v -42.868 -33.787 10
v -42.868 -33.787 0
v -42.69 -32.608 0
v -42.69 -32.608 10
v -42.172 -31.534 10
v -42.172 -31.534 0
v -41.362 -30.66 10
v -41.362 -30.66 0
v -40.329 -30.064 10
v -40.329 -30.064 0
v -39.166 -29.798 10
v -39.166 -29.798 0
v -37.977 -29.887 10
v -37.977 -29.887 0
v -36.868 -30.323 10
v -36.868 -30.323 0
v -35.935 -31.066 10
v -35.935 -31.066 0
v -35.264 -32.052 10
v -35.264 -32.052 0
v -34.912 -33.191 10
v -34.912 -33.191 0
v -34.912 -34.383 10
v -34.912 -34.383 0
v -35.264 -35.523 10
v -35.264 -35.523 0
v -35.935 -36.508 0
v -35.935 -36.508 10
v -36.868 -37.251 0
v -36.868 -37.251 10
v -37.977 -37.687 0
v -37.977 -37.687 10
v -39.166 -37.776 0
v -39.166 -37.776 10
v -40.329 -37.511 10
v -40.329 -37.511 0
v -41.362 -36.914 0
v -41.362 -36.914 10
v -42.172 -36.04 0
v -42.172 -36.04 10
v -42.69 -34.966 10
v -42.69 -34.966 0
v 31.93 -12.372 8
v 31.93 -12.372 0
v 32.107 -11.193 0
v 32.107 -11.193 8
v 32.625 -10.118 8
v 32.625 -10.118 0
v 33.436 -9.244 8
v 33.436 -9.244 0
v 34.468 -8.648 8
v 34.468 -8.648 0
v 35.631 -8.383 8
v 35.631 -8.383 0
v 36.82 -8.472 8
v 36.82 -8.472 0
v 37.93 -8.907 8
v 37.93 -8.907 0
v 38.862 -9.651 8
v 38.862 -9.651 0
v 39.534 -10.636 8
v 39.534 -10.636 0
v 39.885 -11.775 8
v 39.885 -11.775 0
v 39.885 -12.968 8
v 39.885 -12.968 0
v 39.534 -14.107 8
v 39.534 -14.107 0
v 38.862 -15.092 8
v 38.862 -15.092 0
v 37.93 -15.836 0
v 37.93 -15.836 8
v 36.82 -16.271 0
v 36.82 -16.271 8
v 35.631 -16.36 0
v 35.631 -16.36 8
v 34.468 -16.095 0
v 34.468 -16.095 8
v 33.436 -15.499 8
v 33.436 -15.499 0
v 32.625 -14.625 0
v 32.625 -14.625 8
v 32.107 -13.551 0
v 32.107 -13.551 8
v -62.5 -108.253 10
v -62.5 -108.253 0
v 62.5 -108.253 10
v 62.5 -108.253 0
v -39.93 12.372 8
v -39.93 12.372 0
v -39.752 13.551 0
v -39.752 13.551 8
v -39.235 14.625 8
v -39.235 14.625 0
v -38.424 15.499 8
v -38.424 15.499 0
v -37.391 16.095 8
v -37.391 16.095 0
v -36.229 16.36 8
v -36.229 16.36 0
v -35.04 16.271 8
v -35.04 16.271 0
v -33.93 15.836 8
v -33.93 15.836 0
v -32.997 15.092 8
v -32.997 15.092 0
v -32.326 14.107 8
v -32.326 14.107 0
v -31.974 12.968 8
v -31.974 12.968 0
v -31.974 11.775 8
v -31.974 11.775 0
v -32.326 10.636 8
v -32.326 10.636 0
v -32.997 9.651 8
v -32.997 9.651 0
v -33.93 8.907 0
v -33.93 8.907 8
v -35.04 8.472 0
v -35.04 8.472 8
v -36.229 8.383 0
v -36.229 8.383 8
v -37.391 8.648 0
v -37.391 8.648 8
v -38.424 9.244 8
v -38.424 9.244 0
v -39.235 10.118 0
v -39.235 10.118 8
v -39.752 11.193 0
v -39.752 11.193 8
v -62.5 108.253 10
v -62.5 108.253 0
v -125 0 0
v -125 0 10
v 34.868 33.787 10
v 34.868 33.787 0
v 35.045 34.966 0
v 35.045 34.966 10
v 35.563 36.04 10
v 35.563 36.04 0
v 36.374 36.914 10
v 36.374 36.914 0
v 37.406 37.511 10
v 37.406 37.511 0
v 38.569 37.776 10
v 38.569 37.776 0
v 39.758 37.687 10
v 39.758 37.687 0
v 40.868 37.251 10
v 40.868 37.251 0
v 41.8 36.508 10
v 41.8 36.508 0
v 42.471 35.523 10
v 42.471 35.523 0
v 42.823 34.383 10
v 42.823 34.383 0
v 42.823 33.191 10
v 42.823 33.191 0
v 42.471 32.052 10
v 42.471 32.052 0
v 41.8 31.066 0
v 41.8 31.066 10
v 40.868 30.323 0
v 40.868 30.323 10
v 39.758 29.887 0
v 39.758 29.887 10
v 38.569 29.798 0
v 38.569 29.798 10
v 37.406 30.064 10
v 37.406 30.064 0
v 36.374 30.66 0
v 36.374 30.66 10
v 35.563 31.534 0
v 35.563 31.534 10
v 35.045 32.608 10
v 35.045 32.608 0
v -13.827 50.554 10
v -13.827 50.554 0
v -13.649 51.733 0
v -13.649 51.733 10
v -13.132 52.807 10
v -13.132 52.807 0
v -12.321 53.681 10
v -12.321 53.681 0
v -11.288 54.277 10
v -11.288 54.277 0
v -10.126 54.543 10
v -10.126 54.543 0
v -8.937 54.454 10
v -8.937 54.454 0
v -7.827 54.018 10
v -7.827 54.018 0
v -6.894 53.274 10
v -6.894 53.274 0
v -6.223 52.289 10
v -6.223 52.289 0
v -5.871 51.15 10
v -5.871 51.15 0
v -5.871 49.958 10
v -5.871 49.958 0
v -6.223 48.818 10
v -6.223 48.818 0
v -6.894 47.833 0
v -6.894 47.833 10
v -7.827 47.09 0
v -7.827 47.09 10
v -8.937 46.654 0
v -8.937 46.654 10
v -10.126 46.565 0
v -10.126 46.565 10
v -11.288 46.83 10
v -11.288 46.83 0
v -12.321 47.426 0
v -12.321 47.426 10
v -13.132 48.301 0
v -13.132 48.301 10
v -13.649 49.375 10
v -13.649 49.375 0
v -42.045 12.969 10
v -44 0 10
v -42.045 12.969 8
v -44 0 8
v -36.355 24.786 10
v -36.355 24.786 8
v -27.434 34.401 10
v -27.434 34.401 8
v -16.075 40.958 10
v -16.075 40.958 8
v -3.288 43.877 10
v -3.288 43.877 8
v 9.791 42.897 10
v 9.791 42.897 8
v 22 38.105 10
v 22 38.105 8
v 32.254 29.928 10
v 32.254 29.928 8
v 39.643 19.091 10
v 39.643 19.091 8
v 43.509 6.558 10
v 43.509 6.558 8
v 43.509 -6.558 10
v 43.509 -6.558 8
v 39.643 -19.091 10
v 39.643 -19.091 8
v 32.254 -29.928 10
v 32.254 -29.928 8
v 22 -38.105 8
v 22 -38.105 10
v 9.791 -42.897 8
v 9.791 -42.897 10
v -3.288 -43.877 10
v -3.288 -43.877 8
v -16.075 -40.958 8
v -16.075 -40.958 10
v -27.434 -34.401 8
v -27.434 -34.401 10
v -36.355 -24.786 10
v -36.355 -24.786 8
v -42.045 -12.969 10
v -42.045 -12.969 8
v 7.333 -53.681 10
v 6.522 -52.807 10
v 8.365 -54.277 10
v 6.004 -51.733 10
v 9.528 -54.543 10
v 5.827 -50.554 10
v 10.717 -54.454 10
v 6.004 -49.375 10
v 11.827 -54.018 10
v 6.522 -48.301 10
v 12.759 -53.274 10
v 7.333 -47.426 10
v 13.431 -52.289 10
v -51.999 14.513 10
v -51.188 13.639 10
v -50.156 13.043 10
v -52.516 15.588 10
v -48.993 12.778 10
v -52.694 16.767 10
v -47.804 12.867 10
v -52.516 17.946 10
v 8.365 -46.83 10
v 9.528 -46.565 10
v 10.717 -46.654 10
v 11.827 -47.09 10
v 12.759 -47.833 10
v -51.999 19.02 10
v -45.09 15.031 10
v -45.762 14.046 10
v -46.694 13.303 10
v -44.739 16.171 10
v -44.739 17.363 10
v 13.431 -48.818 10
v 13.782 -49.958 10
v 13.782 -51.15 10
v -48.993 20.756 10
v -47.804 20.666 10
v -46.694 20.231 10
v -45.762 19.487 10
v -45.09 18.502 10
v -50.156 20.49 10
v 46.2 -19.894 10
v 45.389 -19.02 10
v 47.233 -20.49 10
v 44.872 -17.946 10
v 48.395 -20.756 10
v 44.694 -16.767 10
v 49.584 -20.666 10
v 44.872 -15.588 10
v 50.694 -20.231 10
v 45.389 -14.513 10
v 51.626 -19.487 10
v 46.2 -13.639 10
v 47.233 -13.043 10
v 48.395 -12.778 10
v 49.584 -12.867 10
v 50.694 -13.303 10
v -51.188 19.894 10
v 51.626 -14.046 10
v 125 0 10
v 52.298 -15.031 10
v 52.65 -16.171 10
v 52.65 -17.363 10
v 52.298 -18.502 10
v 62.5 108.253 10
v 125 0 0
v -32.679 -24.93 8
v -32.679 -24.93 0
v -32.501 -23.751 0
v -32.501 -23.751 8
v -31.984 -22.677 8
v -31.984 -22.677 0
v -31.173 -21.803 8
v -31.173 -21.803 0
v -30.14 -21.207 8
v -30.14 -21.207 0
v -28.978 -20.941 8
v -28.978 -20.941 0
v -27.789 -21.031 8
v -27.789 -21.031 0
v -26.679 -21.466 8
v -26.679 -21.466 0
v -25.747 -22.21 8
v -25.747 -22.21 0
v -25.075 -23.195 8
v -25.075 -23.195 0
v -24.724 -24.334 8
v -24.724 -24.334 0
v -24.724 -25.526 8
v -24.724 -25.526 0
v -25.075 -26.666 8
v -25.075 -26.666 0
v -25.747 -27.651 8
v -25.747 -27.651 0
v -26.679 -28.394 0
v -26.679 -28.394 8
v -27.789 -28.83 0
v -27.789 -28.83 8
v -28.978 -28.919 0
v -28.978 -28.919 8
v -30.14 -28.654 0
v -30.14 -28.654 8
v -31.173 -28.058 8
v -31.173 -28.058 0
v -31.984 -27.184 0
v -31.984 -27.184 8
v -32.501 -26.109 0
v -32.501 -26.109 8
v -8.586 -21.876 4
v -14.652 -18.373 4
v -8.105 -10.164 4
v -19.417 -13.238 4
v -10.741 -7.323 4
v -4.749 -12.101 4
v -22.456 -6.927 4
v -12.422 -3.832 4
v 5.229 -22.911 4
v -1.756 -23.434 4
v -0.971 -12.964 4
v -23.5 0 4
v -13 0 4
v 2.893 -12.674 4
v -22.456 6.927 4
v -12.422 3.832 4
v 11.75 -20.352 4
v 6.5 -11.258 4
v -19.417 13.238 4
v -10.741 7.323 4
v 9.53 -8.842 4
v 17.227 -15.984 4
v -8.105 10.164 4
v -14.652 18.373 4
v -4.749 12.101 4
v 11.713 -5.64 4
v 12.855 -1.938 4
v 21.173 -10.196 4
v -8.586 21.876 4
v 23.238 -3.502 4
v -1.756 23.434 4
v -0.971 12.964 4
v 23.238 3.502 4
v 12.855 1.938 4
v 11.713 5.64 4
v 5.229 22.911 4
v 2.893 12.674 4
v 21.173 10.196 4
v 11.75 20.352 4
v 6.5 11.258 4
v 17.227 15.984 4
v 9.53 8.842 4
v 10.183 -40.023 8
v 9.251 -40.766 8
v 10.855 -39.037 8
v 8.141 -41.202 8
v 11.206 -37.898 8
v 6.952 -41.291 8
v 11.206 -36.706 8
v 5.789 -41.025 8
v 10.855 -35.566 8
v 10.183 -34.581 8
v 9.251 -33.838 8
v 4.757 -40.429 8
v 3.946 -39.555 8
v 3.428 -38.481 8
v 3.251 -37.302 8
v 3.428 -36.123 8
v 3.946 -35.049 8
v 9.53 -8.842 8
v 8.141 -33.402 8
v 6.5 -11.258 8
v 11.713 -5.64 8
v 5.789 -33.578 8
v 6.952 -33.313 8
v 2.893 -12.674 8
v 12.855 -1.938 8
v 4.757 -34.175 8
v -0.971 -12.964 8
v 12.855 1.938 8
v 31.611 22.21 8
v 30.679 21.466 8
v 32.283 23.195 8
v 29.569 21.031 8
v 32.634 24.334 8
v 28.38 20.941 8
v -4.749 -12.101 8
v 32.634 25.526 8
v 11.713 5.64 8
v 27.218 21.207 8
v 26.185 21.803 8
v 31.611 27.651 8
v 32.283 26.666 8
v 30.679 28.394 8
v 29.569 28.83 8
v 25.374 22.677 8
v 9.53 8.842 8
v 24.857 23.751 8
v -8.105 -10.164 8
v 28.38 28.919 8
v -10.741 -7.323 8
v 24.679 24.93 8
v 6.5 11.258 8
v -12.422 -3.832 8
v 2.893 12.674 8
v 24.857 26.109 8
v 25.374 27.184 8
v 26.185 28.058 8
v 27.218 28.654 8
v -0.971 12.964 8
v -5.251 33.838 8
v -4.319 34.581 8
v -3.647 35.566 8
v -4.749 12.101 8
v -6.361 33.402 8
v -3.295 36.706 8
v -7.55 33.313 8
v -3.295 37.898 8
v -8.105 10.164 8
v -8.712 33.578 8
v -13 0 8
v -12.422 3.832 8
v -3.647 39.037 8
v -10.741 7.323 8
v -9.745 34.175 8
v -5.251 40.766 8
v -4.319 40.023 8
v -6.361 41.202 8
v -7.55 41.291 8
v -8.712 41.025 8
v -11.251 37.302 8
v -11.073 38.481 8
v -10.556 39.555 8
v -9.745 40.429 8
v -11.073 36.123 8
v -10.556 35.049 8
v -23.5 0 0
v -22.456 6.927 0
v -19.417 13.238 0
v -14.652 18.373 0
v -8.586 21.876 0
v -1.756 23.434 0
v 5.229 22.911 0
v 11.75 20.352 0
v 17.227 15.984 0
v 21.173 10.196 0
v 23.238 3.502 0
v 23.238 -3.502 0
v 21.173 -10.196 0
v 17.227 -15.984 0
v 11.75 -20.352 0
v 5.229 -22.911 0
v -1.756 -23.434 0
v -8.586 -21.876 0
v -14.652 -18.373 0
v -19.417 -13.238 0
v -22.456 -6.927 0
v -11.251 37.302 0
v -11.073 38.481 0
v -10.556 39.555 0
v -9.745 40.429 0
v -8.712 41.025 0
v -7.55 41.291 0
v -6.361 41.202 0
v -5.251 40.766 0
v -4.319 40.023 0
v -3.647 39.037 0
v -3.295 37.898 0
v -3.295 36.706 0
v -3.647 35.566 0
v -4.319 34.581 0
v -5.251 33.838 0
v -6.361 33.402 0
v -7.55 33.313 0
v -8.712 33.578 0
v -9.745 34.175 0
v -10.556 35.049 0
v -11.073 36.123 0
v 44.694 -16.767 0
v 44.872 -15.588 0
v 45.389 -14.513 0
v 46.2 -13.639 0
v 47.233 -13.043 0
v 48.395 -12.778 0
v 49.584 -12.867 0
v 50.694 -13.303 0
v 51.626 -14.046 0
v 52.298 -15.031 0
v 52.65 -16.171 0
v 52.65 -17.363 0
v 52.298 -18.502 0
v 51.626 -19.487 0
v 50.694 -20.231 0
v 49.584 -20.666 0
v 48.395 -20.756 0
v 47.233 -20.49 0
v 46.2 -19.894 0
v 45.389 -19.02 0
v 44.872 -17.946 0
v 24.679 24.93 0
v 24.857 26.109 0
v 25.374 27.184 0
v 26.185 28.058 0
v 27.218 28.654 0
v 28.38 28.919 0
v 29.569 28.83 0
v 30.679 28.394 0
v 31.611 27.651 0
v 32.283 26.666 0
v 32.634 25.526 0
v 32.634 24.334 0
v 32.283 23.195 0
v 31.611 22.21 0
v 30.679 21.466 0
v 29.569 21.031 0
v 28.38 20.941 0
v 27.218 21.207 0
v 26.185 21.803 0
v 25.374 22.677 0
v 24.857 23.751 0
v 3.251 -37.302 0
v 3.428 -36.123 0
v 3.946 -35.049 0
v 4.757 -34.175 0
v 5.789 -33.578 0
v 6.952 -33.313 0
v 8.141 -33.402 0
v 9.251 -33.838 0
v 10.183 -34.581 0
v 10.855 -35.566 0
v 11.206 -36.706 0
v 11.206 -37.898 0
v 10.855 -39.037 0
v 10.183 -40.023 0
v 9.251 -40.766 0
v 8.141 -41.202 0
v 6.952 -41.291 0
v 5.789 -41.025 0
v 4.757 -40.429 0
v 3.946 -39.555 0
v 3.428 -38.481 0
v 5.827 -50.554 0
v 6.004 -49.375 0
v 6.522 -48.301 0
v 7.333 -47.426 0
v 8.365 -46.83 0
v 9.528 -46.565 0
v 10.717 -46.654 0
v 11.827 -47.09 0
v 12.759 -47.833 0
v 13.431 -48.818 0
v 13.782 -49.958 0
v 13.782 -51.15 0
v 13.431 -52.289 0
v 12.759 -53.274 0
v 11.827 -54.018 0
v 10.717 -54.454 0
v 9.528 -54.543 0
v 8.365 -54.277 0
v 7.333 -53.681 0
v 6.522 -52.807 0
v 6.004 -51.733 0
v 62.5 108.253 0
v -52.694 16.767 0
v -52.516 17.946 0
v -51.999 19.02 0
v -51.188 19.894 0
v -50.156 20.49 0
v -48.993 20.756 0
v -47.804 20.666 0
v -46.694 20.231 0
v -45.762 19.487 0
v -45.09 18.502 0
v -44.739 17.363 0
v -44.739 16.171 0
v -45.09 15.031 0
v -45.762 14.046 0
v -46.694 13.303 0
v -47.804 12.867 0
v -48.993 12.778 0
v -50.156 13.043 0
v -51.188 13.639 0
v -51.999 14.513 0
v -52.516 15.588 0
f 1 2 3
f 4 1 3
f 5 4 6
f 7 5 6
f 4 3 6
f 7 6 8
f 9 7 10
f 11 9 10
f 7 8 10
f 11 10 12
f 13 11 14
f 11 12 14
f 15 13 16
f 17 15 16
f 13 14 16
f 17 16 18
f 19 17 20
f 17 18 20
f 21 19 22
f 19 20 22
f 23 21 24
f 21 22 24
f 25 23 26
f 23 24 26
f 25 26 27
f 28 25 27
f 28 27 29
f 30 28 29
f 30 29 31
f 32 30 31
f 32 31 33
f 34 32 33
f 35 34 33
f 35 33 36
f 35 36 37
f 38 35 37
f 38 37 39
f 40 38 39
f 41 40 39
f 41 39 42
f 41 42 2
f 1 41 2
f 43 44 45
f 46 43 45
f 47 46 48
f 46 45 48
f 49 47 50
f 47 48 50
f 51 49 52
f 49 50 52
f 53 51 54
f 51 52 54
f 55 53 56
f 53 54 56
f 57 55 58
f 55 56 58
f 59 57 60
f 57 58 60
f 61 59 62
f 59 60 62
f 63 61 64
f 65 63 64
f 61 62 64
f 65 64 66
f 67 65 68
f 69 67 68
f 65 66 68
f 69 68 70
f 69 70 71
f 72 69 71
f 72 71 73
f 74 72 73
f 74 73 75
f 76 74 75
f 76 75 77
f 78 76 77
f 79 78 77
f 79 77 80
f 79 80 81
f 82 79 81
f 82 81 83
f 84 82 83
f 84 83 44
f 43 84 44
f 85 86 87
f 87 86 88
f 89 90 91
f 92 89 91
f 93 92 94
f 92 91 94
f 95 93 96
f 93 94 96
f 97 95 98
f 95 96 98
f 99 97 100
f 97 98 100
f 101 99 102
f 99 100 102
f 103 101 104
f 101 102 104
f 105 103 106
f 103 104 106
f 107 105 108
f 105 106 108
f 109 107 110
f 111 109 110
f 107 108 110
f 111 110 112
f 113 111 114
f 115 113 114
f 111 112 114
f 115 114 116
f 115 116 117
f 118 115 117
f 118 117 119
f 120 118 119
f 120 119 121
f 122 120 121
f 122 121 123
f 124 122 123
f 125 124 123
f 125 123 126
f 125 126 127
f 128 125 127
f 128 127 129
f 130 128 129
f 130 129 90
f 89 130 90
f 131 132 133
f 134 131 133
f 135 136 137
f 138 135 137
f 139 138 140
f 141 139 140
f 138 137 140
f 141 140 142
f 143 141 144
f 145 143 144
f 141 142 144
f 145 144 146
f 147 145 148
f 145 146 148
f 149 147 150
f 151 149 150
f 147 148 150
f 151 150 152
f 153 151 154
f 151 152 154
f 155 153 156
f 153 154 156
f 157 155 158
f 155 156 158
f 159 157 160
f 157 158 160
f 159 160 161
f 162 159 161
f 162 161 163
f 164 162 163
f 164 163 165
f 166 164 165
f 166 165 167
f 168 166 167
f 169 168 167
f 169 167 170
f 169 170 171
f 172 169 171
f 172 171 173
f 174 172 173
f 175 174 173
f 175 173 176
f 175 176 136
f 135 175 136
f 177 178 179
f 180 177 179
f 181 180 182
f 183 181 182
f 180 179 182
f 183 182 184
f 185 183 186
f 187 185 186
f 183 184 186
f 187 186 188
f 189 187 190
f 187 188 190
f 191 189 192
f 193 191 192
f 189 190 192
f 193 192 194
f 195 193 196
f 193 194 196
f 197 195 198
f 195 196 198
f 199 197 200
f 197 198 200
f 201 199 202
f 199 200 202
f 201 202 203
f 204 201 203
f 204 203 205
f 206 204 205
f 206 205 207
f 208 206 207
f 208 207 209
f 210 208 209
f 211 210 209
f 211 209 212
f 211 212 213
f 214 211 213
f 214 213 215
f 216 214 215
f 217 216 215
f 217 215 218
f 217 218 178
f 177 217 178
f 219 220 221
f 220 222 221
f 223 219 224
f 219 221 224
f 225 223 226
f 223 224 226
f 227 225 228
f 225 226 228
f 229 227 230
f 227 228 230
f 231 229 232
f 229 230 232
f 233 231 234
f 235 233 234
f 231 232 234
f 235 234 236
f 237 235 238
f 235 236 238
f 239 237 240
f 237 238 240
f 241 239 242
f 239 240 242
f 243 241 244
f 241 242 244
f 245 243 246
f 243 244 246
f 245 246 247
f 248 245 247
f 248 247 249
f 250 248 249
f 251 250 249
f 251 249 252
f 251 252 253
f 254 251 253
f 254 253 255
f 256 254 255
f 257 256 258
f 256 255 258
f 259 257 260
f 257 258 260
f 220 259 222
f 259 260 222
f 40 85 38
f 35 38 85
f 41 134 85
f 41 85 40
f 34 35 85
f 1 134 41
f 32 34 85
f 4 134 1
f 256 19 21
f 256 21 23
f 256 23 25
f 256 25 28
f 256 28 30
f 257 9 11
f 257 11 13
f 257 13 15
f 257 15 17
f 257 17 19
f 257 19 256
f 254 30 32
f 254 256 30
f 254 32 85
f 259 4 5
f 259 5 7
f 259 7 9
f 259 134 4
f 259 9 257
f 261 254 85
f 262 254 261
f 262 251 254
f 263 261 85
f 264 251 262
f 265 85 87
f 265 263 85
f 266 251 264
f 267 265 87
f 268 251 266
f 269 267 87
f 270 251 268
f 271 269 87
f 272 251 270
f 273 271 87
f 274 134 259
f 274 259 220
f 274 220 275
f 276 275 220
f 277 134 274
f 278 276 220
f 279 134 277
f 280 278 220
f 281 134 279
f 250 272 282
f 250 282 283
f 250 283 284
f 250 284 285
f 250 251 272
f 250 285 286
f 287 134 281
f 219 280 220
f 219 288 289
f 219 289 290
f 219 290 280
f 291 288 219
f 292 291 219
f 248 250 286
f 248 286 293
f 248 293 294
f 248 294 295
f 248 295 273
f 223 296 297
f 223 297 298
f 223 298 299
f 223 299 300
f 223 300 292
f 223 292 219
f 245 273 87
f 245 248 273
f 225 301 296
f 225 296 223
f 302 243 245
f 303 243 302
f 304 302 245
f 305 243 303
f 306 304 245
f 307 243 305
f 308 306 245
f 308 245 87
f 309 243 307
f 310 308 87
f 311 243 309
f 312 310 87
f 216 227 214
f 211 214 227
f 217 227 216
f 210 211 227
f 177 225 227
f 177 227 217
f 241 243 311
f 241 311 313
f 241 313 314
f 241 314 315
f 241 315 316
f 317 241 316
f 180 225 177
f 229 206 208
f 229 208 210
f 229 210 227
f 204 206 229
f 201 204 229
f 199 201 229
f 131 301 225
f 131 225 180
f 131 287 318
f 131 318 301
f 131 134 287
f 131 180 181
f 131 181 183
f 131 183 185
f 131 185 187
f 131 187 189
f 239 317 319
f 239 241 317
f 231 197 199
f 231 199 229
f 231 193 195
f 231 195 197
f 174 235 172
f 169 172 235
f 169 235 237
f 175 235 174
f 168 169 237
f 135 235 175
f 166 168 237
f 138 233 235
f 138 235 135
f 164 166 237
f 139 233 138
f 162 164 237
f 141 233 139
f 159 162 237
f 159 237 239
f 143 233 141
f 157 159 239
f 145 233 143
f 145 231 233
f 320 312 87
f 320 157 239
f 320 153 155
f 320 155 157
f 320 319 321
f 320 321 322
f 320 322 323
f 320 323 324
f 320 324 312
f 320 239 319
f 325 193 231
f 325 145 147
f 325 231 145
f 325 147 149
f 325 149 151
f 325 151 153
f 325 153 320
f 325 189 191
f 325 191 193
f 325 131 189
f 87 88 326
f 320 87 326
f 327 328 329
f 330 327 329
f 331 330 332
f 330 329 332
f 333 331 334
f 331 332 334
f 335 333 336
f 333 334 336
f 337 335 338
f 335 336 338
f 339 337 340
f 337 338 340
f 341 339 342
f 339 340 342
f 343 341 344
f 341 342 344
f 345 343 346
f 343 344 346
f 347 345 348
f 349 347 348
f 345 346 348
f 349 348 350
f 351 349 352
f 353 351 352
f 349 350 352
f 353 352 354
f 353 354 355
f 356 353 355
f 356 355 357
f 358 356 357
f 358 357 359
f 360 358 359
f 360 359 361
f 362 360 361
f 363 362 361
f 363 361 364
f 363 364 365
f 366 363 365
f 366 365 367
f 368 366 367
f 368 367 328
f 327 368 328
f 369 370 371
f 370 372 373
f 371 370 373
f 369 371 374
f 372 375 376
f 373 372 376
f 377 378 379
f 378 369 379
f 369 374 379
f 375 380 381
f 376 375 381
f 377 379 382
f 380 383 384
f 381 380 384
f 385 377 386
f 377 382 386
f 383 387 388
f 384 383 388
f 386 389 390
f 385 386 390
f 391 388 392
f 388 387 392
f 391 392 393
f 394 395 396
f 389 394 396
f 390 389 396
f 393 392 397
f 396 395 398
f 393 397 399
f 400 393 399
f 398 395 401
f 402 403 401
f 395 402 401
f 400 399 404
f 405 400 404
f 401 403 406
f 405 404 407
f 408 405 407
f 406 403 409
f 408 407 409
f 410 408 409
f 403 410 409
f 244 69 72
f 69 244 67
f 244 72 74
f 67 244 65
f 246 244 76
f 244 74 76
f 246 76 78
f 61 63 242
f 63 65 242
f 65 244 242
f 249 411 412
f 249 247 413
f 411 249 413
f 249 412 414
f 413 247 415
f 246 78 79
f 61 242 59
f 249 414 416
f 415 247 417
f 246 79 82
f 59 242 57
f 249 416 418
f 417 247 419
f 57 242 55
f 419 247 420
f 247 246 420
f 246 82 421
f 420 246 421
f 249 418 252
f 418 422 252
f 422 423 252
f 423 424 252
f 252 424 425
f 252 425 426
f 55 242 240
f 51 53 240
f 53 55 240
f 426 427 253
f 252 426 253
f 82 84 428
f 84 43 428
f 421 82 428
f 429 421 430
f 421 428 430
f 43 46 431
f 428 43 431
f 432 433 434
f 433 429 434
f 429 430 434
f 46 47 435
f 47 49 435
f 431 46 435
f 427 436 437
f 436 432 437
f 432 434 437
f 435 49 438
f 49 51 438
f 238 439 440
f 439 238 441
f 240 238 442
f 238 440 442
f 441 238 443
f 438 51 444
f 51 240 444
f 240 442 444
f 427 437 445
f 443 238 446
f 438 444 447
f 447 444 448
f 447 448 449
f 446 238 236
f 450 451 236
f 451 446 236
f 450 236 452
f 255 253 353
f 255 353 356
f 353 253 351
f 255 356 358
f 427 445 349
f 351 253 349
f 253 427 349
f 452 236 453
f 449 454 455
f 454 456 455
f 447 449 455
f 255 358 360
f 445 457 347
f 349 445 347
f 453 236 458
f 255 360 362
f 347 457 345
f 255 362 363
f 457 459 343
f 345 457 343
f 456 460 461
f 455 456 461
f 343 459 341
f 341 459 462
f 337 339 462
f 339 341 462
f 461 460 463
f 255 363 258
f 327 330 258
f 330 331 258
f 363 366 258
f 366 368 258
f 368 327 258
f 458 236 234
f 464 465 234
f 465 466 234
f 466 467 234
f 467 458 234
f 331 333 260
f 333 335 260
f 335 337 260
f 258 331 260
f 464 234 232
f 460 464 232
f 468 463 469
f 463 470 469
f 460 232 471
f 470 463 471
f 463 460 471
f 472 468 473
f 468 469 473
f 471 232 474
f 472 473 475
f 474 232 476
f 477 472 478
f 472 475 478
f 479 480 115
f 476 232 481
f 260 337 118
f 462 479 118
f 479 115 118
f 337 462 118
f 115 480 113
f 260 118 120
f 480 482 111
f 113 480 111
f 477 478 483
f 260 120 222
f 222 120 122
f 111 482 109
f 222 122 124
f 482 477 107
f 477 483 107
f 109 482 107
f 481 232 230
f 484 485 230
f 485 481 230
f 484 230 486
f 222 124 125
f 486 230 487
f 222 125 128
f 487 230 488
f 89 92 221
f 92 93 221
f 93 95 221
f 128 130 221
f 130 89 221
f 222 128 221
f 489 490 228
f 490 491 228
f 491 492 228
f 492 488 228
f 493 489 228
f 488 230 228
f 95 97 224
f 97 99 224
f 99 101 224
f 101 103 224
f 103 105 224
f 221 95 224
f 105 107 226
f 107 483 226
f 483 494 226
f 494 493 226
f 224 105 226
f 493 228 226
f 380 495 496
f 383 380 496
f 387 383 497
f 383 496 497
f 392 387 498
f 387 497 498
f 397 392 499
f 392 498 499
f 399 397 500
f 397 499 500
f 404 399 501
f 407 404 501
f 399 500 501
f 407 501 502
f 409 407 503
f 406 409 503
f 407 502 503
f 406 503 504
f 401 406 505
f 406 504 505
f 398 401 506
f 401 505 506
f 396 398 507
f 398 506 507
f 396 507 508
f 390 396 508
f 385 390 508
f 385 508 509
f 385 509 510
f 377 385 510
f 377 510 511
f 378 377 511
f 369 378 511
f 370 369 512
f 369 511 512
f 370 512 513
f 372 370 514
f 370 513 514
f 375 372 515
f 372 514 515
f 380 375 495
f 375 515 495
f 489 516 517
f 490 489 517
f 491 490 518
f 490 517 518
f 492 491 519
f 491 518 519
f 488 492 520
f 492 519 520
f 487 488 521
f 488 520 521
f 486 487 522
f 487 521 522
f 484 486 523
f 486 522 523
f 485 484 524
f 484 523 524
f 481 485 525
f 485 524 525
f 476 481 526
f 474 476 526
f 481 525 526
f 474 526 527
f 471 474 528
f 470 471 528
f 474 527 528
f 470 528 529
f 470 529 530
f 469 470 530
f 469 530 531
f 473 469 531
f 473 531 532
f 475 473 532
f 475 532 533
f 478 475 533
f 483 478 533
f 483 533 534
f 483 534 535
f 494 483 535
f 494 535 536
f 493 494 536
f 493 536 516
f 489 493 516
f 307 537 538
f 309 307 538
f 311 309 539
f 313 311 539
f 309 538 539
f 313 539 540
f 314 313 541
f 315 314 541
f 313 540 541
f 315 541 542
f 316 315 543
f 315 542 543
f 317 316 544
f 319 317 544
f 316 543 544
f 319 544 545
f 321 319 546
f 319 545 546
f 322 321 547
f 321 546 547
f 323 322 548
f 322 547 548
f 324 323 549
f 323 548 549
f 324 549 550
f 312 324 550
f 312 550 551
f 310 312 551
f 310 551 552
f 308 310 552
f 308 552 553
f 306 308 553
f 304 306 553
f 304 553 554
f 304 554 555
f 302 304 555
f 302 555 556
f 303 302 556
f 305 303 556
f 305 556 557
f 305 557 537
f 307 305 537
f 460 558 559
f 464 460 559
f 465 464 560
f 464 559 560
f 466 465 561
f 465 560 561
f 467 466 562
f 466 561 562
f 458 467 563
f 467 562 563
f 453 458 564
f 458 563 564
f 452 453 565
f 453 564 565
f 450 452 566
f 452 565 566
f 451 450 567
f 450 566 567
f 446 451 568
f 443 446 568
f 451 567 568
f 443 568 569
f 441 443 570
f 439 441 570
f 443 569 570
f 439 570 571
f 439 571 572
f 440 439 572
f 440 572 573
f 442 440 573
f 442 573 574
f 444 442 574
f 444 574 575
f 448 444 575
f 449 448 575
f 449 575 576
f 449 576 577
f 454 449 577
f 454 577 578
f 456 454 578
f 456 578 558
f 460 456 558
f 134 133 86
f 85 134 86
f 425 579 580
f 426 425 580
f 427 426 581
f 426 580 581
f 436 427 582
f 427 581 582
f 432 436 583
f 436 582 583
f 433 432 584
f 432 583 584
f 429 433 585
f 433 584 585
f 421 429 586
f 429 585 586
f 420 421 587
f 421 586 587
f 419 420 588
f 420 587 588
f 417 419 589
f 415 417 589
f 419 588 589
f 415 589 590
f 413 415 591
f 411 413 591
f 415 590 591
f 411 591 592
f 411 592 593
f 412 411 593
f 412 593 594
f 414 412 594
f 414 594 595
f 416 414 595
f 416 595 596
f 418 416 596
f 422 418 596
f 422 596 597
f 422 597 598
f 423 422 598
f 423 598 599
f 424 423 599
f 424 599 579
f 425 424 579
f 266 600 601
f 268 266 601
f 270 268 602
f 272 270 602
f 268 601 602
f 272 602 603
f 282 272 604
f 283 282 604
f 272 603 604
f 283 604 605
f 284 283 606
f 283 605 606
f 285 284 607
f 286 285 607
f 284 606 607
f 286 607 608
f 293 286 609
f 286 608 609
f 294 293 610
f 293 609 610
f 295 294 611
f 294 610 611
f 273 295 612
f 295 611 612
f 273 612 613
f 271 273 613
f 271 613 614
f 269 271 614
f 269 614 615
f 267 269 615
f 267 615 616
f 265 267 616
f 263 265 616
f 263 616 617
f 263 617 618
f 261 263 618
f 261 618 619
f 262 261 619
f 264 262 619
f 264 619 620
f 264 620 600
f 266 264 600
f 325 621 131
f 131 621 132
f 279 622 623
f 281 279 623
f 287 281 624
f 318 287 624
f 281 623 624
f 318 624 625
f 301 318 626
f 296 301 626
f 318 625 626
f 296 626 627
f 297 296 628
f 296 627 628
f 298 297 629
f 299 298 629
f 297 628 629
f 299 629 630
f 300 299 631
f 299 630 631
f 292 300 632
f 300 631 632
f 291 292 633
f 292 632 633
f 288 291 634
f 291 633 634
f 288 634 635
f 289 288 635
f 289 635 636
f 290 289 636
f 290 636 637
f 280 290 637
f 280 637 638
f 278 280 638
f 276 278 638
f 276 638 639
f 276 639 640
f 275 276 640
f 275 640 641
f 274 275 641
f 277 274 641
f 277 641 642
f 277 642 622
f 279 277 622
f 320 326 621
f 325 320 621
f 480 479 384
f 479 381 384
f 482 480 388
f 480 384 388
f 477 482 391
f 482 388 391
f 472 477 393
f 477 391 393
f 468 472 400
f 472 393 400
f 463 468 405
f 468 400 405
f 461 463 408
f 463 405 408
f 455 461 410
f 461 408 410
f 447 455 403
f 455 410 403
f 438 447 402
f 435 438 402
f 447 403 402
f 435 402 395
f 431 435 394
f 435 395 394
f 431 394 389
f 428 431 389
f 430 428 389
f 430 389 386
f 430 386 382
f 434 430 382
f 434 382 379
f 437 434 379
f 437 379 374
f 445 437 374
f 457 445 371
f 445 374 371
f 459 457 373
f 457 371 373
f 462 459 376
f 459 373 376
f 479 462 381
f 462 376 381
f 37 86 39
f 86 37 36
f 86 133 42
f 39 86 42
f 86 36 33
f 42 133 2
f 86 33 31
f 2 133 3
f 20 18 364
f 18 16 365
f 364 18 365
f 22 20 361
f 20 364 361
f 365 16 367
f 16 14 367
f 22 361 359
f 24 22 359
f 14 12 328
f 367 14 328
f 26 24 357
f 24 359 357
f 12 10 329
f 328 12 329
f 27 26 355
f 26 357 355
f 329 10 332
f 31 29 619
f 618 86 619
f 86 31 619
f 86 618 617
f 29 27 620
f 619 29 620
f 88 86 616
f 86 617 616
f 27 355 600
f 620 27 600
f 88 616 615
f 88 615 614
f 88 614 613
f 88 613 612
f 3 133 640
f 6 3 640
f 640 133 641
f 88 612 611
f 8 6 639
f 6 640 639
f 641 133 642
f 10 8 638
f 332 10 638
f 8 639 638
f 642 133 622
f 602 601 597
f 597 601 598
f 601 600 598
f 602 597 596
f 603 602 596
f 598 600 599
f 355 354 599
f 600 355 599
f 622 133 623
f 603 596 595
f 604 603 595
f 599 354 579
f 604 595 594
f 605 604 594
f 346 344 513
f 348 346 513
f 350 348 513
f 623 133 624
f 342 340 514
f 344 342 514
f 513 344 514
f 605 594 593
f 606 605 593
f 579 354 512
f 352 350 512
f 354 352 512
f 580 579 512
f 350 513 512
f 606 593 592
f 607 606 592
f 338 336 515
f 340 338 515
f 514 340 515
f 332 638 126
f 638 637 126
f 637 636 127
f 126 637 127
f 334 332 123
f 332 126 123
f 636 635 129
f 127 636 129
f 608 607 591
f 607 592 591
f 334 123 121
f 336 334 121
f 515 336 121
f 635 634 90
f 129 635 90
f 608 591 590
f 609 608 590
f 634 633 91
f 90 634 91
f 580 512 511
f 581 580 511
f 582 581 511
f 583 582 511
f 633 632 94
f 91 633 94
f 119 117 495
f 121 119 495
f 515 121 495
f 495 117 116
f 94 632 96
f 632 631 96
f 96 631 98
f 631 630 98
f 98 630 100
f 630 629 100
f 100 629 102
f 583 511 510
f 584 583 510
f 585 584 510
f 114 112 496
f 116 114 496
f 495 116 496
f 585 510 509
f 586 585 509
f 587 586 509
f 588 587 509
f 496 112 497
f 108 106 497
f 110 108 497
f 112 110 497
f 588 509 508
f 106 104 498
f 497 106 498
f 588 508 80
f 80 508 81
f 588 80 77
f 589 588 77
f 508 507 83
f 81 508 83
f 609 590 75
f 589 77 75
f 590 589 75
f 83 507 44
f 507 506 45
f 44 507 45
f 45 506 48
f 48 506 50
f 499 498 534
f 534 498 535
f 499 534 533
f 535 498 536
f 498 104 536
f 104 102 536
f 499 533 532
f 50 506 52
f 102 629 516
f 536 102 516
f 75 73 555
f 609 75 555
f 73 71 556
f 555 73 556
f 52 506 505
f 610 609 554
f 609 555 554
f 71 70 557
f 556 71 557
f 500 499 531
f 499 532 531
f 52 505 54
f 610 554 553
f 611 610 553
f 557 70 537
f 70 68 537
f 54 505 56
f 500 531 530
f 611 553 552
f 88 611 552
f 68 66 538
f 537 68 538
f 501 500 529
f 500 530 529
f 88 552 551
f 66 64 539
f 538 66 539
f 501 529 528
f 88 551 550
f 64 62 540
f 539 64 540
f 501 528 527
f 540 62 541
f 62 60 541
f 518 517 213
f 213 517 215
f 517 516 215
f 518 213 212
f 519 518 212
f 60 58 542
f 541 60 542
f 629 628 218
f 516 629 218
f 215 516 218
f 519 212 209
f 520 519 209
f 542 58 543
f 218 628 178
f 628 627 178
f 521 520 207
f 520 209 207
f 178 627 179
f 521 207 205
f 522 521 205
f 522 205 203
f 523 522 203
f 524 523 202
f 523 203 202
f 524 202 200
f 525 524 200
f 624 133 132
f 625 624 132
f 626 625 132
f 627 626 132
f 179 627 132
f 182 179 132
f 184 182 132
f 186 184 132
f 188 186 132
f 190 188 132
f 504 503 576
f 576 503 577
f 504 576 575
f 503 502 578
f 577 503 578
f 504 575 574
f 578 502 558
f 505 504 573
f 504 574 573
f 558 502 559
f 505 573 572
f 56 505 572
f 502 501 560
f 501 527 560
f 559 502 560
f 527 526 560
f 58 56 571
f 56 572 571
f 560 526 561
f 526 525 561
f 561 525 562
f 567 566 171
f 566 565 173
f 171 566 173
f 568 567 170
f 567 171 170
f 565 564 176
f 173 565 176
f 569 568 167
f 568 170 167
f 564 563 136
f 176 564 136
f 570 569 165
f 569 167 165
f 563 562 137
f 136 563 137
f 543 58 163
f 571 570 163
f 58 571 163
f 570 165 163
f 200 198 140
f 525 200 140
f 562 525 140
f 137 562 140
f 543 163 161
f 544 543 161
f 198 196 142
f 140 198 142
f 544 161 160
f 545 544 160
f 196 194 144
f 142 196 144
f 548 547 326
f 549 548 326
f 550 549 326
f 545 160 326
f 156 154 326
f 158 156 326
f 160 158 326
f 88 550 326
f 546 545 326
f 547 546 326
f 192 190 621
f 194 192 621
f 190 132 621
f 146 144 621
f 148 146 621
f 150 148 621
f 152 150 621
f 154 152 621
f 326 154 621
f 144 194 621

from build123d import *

# Parameters (mm, degrees)
F1_DEPTH = 10
F5_D     = 8
F5_DEPTH = 15
F6_D     = 8
F6_DEPTH = 15


with BuildPart() as f1:
    # F0 (on Top) → F1 (new body)
    with BuildSketch(Plane.XY):
        Polygon((62.5, -108.253175), (125, 0), (62.5, 108.253175), (-62.5, 108.253175), (-125, 0), (-62.5, -108.253175), align=None)
    extrude(amount=F1_DEPTH)

    # F2 (on Front) → F3 (revolve, cut)
    with BuildSketch(Plane.XZ):
        Polygon((-23.5, 4), (-23.5, -10), (0, -10), (0, 18), (-44, 18), (-44, 8), (-13, 8), (-13, 4), align=None)
    revolve(axis=Axis((0, 0, -2.490325), (0, 0, -1)), mode=Mode.SUBTRACT)

    # F5
    with Locations(Plane.XY.offset(10)):
        with Locations((-9.826663, 50.5538), (38.867543, 33.78704), (48.694207, -16.76676), (9.826663, -50.5538), (-38.867543, -33.78704), (-48.694207, 16.76676)):
            Hole(F5_D / 2, depth=F5_DEPTH)

    # F6
    with Locations(Plane.XY.offset(10)):
        with Locations((-7.250742, 37.301833), (28.678964, 24.930243), (35.929706, -12.37159), (7.250742, -37.301833), (-28.678964, -24.930243), (-35.929706, 12.37159)):
            Hole(F6_D / 2, depth=F6_DEPTH)


solid = f1.part
